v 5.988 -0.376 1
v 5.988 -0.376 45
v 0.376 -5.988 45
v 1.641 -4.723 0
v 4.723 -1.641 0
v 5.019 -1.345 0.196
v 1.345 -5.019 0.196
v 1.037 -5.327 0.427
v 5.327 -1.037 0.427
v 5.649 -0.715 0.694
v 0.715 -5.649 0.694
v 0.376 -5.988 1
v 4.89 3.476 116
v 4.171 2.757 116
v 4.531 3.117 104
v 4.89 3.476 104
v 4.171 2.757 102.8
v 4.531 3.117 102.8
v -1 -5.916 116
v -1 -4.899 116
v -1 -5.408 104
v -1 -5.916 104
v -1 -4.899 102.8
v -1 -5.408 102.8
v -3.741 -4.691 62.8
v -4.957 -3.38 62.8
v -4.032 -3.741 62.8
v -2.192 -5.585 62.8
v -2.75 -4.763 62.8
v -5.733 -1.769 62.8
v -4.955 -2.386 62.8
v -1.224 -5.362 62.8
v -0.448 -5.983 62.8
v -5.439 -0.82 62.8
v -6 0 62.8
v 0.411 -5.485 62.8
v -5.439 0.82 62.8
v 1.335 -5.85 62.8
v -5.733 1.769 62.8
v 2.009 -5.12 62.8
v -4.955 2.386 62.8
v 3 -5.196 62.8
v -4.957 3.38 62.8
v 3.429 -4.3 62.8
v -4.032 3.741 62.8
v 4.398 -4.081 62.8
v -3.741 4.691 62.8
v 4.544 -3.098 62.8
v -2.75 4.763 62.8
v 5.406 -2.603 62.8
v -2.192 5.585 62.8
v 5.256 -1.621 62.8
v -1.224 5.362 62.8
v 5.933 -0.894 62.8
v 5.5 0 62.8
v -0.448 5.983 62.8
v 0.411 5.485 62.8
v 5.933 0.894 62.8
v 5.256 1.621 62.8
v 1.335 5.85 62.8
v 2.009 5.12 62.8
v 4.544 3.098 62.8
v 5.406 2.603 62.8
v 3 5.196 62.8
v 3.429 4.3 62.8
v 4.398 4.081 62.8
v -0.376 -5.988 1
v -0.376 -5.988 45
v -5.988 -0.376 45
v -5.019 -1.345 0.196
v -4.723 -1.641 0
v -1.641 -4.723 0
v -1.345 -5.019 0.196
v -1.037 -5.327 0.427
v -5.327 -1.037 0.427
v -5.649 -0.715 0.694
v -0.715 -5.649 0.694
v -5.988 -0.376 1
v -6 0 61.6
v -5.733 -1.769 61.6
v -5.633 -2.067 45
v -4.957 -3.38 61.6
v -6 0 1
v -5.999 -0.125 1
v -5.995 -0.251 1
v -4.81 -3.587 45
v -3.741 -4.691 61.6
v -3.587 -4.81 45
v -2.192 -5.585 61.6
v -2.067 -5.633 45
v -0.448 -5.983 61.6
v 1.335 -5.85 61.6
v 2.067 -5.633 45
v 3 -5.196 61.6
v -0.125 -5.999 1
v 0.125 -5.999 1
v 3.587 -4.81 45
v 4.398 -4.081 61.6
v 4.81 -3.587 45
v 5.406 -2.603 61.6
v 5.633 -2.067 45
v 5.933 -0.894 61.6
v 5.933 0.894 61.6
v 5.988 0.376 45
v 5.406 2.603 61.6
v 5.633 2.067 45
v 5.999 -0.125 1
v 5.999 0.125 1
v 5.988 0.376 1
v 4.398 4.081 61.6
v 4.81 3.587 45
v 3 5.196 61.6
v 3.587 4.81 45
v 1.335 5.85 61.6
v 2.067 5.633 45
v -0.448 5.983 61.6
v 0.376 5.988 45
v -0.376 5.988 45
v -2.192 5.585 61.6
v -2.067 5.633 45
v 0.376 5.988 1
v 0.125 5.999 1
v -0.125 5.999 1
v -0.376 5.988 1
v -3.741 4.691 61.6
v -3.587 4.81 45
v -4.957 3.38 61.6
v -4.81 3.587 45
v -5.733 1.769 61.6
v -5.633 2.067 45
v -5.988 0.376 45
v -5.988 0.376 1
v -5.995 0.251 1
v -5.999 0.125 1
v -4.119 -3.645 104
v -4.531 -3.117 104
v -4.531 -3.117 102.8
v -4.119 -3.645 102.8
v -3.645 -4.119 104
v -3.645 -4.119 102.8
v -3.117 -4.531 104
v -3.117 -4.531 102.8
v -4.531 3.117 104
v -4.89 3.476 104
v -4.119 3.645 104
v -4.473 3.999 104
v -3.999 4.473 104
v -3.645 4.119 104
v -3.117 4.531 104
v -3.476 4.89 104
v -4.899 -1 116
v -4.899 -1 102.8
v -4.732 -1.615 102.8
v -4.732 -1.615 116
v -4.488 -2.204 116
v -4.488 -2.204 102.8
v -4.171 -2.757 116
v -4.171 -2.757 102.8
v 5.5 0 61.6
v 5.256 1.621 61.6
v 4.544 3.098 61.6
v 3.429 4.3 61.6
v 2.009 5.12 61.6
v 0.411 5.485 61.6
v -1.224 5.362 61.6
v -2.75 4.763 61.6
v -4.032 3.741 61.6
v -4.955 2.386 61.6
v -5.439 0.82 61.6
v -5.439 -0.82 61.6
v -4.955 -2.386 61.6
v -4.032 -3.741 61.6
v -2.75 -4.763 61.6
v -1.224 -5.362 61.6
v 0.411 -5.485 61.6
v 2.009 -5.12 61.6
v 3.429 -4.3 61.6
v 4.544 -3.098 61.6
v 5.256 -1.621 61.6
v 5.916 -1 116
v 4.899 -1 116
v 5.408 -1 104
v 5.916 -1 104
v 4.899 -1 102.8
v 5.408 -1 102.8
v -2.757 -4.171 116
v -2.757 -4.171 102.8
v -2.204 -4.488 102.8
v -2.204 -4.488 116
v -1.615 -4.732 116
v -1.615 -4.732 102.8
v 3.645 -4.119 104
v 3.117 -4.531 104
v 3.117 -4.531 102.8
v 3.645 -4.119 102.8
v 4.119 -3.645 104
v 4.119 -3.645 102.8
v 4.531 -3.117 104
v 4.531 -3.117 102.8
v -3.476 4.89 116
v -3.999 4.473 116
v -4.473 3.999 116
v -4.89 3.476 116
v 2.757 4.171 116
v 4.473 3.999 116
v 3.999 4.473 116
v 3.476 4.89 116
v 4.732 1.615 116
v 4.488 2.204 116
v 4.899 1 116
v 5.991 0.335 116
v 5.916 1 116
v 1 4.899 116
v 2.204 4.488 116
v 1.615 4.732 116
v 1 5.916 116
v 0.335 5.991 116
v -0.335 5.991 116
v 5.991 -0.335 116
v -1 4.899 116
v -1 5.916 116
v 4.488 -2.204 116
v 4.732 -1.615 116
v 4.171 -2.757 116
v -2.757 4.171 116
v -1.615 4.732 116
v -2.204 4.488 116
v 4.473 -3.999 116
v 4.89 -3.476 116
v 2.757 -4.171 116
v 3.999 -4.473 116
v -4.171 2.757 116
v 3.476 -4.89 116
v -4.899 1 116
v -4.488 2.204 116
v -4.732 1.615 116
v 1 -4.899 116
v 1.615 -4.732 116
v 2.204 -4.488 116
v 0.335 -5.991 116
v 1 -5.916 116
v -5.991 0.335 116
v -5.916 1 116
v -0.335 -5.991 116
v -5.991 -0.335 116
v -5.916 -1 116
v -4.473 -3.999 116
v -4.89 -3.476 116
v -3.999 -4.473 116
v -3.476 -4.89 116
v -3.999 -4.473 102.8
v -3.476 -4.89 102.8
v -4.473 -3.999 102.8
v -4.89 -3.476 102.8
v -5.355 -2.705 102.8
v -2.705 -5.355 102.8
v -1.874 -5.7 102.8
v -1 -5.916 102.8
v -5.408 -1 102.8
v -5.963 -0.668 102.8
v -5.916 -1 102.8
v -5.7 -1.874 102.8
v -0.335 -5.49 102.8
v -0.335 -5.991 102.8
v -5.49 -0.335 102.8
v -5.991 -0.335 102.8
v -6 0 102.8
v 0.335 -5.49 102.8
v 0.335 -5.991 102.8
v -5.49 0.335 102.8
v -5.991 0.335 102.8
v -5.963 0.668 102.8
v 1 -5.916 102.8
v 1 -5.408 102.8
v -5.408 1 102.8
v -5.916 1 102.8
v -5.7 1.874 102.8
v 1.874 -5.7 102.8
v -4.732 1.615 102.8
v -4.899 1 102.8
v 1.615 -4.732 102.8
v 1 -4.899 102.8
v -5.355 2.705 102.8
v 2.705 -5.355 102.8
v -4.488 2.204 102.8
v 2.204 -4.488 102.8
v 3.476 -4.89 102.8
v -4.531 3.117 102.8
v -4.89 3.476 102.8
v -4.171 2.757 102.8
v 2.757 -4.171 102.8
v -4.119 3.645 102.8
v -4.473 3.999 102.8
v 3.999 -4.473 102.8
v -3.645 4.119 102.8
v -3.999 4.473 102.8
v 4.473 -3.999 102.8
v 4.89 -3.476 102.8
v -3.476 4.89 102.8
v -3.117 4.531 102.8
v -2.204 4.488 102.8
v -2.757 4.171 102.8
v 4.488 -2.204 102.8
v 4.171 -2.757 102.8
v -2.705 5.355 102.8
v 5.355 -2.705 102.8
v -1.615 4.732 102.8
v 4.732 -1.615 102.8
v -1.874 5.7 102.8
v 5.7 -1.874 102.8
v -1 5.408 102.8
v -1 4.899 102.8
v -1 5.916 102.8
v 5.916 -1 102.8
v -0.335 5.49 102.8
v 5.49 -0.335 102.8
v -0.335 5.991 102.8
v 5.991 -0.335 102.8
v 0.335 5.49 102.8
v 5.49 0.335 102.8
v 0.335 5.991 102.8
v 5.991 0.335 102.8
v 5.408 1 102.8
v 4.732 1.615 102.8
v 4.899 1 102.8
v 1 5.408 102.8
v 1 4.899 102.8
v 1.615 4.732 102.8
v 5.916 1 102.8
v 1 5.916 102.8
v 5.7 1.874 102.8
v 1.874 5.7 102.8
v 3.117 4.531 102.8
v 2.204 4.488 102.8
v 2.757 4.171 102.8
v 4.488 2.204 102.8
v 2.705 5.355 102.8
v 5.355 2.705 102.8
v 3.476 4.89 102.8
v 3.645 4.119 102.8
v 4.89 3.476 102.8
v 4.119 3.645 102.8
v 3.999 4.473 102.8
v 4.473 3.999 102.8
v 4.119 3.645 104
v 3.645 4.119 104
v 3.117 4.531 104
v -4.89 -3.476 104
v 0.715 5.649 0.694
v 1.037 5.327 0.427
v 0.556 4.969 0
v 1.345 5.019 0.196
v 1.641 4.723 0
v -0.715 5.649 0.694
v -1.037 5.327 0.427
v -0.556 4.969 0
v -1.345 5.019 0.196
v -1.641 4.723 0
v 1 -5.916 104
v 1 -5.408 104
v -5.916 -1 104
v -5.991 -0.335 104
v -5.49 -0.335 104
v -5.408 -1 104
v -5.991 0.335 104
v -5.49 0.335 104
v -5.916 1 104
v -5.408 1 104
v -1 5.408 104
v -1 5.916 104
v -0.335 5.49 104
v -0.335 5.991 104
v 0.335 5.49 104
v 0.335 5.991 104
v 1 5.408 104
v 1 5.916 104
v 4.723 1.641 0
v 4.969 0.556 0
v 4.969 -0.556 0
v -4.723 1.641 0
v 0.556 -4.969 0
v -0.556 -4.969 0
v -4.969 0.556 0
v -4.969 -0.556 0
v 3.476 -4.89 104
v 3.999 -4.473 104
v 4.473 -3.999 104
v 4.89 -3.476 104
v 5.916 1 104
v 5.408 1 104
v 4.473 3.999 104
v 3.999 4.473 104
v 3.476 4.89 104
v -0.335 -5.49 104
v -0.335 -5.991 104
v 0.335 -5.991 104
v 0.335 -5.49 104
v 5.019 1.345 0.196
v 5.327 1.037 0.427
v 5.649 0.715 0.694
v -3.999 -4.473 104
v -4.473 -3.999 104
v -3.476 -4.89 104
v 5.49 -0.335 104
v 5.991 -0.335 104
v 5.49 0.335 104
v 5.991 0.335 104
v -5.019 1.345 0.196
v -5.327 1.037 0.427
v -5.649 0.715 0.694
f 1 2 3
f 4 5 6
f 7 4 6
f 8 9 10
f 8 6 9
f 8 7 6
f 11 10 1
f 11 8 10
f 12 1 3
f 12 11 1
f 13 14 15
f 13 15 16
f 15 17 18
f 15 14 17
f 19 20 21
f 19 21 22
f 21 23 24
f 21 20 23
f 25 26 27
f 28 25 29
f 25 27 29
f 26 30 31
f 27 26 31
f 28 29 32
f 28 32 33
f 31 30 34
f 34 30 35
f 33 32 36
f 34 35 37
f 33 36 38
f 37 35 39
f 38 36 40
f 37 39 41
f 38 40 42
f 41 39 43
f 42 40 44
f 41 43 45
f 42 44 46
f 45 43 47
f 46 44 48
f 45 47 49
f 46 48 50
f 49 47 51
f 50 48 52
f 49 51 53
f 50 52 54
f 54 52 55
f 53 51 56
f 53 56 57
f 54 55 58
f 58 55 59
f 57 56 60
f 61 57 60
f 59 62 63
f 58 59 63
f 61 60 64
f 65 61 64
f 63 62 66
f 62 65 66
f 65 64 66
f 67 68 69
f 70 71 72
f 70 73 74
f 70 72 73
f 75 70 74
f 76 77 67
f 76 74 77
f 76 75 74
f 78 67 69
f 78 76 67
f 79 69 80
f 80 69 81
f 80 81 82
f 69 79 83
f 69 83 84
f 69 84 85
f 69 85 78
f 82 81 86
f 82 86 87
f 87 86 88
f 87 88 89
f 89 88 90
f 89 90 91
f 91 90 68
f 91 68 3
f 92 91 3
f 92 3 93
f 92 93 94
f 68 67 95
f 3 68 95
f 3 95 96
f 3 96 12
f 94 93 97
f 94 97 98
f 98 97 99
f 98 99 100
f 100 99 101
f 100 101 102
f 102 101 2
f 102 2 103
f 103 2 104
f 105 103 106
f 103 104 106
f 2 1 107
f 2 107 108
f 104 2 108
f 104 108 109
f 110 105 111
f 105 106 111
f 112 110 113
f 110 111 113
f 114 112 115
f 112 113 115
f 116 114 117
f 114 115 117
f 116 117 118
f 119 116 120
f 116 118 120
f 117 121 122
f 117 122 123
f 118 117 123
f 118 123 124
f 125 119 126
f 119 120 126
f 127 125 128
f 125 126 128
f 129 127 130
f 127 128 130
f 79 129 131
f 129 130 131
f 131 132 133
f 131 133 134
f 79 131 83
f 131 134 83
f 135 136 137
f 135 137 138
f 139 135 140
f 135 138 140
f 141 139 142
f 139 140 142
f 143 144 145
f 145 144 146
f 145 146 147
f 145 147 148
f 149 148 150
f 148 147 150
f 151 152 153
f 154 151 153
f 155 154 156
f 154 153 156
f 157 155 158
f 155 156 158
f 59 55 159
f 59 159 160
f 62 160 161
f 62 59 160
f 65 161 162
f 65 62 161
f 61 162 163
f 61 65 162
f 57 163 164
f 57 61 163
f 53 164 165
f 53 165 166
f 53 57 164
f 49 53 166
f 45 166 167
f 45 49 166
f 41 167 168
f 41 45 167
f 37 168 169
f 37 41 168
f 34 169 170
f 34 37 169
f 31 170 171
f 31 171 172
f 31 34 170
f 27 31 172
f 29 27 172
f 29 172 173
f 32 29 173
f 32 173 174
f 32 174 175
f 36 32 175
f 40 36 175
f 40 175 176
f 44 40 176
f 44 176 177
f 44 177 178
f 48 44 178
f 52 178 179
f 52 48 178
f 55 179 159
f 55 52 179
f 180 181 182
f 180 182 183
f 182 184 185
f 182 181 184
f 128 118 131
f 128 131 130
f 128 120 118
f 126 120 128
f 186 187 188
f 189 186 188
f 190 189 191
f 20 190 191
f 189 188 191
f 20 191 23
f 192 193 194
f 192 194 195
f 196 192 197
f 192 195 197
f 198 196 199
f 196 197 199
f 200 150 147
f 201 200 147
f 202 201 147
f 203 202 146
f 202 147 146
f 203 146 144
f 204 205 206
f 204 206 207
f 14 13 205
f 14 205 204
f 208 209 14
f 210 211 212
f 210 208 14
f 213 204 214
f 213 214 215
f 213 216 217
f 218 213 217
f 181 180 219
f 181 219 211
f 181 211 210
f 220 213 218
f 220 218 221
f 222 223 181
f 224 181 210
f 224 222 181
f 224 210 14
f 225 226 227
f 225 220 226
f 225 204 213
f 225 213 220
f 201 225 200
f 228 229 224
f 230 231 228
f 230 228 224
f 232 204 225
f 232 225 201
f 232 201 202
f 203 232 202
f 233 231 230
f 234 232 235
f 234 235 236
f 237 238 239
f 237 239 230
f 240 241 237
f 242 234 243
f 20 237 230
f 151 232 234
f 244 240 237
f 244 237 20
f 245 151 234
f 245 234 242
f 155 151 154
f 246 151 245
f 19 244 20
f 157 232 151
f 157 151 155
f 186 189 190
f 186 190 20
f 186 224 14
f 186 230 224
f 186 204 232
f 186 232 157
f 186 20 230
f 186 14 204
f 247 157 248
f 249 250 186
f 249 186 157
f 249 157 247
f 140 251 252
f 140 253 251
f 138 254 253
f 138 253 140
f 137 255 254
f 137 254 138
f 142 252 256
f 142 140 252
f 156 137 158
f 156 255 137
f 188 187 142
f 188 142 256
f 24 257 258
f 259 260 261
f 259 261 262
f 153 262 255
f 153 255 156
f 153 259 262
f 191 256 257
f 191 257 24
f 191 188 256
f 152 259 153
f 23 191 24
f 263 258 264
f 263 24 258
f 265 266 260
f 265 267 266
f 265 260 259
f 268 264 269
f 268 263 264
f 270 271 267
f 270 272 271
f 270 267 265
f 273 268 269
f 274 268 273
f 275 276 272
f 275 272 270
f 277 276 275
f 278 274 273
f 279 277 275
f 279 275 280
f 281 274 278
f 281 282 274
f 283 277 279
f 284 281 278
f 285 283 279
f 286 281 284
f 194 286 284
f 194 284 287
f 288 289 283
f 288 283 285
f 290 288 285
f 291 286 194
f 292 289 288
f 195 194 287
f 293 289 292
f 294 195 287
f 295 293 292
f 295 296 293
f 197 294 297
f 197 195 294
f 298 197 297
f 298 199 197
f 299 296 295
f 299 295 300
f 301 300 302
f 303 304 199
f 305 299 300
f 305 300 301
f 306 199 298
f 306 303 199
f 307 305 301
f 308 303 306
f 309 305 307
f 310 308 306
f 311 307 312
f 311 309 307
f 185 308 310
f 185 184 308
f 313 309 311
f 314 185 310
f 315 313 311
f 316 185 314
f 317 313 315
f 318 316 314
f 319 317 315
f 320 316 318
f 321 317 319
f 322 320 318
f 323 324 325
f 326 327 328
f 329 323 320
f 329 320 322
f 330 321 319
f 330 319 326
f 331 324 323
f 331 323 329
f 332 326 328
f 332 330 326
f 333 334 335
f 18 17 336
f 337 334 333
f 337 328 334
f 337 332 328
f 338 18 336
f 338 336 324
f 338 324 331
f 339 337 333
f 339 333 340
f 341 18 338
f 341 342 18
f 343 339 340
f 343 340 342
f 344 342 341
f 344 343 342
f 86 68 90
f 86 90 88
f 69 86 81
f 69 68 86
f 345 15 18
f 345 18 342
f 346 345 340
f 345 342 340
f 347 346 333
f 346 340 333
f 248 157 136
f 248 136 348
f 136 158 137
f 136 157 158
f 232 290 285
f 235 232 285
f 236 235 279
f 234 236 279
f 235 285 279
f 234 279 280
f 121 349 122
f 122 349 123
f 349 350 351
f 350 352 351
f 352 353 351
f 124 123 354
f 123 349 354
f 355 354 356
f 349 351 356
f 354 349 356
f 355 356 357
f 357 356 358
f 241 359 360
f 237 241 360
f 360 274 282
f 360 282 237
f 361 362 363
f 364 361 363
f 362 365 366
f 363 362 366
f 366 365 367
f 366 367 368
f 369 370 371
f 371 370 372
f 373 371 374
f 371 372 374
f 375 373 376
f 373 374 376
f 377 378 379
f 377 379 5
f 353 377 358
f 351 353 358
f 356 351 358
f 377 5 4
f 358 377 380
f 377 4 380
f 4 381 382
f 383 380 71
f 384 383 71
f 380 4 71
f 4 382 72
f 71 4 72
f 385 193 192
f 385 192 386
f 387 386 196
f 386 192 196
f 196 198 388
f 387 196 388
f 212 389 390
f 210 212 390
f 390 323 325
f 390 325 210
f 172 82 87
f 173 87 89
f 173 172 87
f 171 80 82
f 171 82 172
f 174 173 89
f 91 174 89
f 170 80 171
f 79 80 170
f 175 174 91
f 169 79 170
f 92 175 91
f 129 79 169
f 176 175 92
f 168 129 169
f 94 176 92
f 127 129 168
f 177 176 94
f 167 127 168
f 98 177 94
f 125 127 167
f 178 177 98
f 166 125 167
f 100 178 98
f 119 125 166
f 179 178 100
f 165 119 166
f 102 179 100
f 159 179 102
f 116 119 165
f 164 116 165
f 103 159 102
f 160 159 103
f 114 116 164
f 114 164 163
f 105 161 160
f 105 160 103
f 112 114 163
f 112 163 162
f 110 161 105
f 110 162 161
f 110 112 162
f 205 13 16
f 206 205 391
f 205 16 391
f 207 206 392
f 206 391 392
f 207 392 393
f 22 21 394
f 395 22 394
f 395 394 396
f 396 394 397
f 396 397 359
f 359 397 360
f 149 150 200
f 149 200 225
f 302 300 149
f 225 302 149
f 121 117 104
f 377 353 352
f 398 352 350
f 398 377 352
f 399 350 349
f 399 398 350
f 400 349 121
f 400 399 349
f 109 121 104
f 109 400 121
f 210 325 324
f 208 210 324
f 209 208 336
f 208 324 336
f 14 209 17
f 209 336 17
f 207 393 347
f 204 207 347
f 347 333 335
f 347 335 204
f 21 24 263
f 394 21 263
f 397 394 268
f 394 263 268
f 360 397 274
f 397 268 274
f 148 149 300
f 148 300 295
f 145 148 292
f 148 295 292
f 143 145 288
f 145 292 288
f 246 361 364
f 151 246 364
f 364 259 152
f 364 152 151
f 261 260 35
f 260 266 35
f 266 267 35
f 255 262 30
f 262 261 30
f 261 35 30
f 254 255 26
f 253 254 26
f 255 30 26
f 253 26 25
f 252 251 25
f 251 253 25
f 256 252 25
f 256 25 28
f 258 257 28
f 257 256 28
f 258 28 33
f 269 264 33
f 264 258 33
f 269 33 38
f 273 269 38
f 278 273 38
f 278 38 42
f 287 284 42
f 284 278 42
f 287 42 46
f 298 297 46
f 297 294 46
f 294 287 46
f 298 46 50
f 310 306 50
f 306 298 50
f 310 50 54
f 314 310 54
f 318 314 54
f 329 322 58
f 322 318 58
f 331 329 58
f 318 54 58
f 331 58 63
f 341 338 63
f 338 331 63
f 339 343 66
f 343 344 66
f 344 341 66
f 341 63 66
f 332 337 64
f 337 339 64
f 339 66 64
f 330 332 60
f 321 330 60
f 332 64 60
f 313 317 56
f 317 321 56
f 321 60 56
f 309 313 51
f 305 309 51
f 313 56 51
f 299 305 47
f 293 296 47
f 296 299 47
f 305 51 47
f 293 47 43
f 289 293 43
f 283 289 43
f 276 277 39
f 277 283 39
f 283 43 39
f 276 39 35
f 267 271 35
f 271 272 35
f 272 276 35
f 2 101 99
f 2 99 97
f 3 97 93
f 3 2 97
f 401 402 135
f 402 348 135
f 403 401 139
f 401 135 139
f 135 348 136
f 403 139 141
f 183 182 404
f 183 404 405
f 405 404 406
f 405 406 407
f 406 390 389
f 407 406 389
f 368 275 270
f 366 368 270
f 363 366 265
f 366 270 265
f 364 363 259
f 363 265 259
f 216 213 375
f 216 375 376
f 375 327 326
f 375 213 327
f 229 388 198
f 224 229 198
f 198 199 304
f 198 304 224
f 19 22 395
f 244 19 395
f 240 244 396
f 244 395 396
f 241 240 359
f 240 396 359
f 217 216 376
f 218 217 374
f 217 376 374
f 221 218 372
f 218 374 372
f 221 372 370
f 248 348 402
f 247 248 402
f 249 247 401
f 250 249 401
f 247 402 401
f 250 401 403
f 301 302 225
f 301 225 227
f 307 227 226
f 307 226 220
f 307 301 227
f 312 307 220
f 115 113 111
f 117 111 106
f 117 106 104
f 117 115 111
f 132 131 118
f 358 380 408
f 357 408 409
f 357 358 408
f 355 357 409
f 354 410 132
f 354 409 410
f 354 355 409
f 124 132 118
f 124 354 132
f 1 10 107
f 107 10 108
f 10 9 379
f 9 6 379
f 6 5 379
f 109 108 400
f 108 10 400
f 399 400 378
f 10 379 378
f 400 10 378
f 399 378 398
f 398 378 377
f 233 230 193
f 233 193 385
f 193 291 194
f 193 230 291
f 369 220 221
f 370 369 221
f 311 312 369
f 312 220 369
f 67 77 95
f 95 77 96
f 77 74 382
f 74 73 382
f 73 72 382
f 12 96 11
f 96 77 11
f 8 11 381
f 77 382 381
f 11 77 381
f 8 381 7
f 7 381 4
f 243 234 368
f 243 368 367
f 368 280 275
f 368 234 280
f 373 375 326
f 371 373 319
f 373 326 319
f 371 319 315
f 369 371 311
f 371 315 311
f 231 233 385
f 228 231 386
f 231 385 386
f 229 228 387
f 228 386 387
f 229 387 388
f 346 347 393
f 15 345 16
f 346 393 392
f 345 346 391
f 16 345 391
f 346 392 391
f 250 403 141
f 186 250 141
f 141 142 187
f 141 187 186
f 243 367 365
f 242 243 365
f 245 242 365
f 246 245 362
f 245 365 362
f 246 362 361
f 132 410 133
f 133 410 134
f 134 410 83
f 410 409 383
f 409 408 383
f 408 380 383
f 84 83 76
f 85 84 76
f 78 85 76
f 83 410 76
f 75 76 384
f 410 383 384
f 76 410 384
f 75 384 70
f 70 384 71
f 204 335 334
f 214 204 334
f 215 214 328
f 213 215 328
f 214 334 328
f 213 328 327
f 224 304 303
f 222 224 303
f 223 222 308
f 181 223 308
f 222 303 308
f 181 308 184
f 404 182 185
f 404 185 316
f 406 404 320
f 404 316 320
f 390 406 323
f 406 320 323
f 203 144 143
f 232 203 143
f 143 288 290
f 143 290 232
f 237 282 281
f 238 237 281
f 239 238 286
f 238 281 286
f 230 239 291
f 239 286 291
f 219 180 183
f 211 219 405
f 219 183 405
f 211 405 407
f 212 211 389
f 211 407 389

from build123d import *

# Parameters (mm, degrees)
SKETCH_1_R          = 6
EXTRUDE_1_DEPTH     = 116
CUT_EXTRUDE_START   = -13.2
SKETCH_2_OUTSIDE_W  = 37.446
SKETCH_2_OUTSIDE_H  = 37.446
SKETCH_2_OUTSIDE_R  = 5.5
CUT_EXTRUDE_1_DEPTH = 1.2
CUT_EXTRUDE_START_2 = -40
SKETCH_3_OUTSIDE_W  = 37.446
SKETCH_3_OUTSIDE_H  = 37.446
SKETCH_3_OUTSIDE_R  = 5.5
CUT_EXTRUDE_2_DEPTH = 1.2
CUT_EXTRUDE_3_DEPTH = 13.2
CHAMFER_1_SIZE      = 1
SKETCH_5_OUTSIDE_W  = 37.446
SKETCH_5_OUTSIDE_H  = 37.446
CUT_EXTRUDE_4_DEPTH = 45


with BuildPart() as part:
    # 草图1 → 凸台-拉伸1 (new body)
    with BuildSketch(Plane.XY):
        with Locations(Location((0, 0, 0), (0, 0, 180))):
            Circle(SKETCH_1_R)
    extrude(amount=EXTRUDE_1_DEPTH)

    # 草图2 outside → 切除-拉伸1 (cut)
    with BuildSketch(Plane.XY.offset(116).offset(CUT_EXTRUDE_START)):
        Rectangle(SKETCH_2_OUTSIDE_W, SKETCH_2_OUTSIDE_H)
        Circle(SKETCH_2_OUTSIDE_R, mode=Mode.SUBTRACT)
    extrude(amount=CUT_EXTRUDE_1_DEPTH, mode=Mode.SUBTRACT)

    # 草图3 outside → 切除-拉伸2 (cut)
    with BuildSketch(Plane.XY.offset(102.8).offset(CUT_EXTRUDE_START_2)):
        Rectangle(SKETCH_3_OUTSIDE_W, SKETCH_3_OUTSIDE_H)
        Circle(SKETCH_3_OUTSIDE_R, mode=Mode.SUBTRACT)
    extrude(amount=-CUT_EXTRUDE_2_DEPTH, mode=Mode.SUBTRACT)

    # 草图4 → 切除-拉伸3 (cut)
    with BuildSketch(Plane.XY.offset(116).offset(CUT_EXTRUDE_START)):
        with BuildLine():
            Line((-1, 4.898979486), (-1, 5.916079783))
            ThreePointArc((-1, 5.916079783), (-2.296100594, 5.543277195), (-3.476193351, 4.890406914))
            Line((-3.476193351, 4.890406914), (-2.756994834, 4.171208396))
            ThreePointArc((-2.756994834, 4.171208396), (-1.913417162, 4.619397663), (-1, 4.898979486))
        make_face()
        with BuildLine():
            Line((1, 4.898979486), (1, 5.916079783))
            ThreePointArc((1, 5.916079783), (2.296100594, 5.543277195), (3.476193351, 4.890406914))
            Line((3.476193351, 4.890406914), (2.756994834, 4.171208396))
            ThreePointArc((2.756994834, 4.171208396), (1.913417162, 4.619397663), (1, 4.898979486))
        make_face()
        with BuildLine():
            Line((4.171208396, 2.756994834), (4.890406914, 3.476193351))
            ThreePointArc((4.890406914, 3.476193351), (5.543277195, 2.296100594), (5.916079783, 1))
            Line((5.916079783, 1), (4.898979486, 1))
            ThreePointArc((4.898979486, 1), (4.619397663, 1.913417162), (4.171208396, 2.756994834))
        make_face()
        with BuildLine():
            Line((4.898979486, -1), (5.916079783, -1))
            ThreePointArc((5.916079783, -1), (5.543277195, -2.296100594), (4.890406914, -3.476193351))
            Line((4.890406914, -3.476193351), (4.171208396, -2.756994834))
            ThreePointArc((4.171208396, -2.756994834), (4.619397663, -1.913417162), (4.898979486, -1))
        make_face()
        with BuildLine():
            Line((2.756994834, -4.171208396), (3.476193351, -4.890406914))
            ThreePointArc((3.476193351, -4.890406914), (2.296100594, -5.543277195), (1, -5.916079783))
            Line((1, -5.916079783), (1, -4.898979486))
            ThreePointArc((1, -4.898979486), (1.913417162, -4.619397663), (2.756994834, -4.171208396))
        make_face()
        with BuildLine():
            Line((-1, -4.898979486), (-1, -5.916079783))
            ThreePointArc((-1, -5.916079783), (-2.296100594, -5.543277195), (-3.476193351, -4.890406914))
            Line((-3.476193351, -4.890406914), (-2.756994834, -4.171208396))
            ThreePointArc((-2.756994834, -4.171208396), (-1.913417162, -4.619397663), (-1, -4.898979486))
        make_face()
        with BuildLine():
            Line((-4.171208396, -2.756994834), (-4.890406914, -3.476193351))
            ThreePointArc((-4.890406914, -3.476193351), (-5.543277195, -2.296100594), (-5.916079783, -1))
            Line((-5.916079783, -1), (-4.898979486, -1))
            ThreePointArc((-4.898979486, -1), (-4.619397663, -1.913417162), (-4.171208396, -2.756994834))
        make_face()
        with BuildLine():
            Line((-4.898979486, 1), (-5.916079783, 1))
            ThreePointArc((-5.916079783, 1), (-5.543277195, 2.296100594), (-4.890406914, 3.476193351))
            Line((-4.890406914, 3.476193351), (-4.171208396, 2.756994834))
            ThreePointArc((-4.171208396, 2.756994834), (-4.619397663, 1.913417162), (-4.898979486, 1))
        make_face()
    extrude(amount=CUT_EXTRUDE_3_DEPTH, mode=Mode.SUBTRACT)

    # 倒角1
    chamfer_1_edges = [part.edges().sort_by_distance(p)[0] for p in [
        (6, 0, 0),
    ]]
    chamfer(chamfer_1_edges, length=CHAMFER_1_SIZE)

    # 草图5 outside → 切除-拉伸4 (cut)
    with BuildSketch(Plane(origin=(0, 0, 0), x_dir=(-1, 0, 0), z_dir=(0, 0, -1))):
        Rectangle(SKETCH_5_OUTSIDE_W, SKETCH_5_OUTSIDE_H)
        Polygon((0, -6.363961031), (6.363961031, 0), (0, 6.363961031), (-6.363961031, 0), align=None, mode=Mode.SUBTRACT)
    extrude(amount=-CUT_EXTRUDE_4_DEPTH, mode=Mode.SUBTRACT)


solid = part.part
